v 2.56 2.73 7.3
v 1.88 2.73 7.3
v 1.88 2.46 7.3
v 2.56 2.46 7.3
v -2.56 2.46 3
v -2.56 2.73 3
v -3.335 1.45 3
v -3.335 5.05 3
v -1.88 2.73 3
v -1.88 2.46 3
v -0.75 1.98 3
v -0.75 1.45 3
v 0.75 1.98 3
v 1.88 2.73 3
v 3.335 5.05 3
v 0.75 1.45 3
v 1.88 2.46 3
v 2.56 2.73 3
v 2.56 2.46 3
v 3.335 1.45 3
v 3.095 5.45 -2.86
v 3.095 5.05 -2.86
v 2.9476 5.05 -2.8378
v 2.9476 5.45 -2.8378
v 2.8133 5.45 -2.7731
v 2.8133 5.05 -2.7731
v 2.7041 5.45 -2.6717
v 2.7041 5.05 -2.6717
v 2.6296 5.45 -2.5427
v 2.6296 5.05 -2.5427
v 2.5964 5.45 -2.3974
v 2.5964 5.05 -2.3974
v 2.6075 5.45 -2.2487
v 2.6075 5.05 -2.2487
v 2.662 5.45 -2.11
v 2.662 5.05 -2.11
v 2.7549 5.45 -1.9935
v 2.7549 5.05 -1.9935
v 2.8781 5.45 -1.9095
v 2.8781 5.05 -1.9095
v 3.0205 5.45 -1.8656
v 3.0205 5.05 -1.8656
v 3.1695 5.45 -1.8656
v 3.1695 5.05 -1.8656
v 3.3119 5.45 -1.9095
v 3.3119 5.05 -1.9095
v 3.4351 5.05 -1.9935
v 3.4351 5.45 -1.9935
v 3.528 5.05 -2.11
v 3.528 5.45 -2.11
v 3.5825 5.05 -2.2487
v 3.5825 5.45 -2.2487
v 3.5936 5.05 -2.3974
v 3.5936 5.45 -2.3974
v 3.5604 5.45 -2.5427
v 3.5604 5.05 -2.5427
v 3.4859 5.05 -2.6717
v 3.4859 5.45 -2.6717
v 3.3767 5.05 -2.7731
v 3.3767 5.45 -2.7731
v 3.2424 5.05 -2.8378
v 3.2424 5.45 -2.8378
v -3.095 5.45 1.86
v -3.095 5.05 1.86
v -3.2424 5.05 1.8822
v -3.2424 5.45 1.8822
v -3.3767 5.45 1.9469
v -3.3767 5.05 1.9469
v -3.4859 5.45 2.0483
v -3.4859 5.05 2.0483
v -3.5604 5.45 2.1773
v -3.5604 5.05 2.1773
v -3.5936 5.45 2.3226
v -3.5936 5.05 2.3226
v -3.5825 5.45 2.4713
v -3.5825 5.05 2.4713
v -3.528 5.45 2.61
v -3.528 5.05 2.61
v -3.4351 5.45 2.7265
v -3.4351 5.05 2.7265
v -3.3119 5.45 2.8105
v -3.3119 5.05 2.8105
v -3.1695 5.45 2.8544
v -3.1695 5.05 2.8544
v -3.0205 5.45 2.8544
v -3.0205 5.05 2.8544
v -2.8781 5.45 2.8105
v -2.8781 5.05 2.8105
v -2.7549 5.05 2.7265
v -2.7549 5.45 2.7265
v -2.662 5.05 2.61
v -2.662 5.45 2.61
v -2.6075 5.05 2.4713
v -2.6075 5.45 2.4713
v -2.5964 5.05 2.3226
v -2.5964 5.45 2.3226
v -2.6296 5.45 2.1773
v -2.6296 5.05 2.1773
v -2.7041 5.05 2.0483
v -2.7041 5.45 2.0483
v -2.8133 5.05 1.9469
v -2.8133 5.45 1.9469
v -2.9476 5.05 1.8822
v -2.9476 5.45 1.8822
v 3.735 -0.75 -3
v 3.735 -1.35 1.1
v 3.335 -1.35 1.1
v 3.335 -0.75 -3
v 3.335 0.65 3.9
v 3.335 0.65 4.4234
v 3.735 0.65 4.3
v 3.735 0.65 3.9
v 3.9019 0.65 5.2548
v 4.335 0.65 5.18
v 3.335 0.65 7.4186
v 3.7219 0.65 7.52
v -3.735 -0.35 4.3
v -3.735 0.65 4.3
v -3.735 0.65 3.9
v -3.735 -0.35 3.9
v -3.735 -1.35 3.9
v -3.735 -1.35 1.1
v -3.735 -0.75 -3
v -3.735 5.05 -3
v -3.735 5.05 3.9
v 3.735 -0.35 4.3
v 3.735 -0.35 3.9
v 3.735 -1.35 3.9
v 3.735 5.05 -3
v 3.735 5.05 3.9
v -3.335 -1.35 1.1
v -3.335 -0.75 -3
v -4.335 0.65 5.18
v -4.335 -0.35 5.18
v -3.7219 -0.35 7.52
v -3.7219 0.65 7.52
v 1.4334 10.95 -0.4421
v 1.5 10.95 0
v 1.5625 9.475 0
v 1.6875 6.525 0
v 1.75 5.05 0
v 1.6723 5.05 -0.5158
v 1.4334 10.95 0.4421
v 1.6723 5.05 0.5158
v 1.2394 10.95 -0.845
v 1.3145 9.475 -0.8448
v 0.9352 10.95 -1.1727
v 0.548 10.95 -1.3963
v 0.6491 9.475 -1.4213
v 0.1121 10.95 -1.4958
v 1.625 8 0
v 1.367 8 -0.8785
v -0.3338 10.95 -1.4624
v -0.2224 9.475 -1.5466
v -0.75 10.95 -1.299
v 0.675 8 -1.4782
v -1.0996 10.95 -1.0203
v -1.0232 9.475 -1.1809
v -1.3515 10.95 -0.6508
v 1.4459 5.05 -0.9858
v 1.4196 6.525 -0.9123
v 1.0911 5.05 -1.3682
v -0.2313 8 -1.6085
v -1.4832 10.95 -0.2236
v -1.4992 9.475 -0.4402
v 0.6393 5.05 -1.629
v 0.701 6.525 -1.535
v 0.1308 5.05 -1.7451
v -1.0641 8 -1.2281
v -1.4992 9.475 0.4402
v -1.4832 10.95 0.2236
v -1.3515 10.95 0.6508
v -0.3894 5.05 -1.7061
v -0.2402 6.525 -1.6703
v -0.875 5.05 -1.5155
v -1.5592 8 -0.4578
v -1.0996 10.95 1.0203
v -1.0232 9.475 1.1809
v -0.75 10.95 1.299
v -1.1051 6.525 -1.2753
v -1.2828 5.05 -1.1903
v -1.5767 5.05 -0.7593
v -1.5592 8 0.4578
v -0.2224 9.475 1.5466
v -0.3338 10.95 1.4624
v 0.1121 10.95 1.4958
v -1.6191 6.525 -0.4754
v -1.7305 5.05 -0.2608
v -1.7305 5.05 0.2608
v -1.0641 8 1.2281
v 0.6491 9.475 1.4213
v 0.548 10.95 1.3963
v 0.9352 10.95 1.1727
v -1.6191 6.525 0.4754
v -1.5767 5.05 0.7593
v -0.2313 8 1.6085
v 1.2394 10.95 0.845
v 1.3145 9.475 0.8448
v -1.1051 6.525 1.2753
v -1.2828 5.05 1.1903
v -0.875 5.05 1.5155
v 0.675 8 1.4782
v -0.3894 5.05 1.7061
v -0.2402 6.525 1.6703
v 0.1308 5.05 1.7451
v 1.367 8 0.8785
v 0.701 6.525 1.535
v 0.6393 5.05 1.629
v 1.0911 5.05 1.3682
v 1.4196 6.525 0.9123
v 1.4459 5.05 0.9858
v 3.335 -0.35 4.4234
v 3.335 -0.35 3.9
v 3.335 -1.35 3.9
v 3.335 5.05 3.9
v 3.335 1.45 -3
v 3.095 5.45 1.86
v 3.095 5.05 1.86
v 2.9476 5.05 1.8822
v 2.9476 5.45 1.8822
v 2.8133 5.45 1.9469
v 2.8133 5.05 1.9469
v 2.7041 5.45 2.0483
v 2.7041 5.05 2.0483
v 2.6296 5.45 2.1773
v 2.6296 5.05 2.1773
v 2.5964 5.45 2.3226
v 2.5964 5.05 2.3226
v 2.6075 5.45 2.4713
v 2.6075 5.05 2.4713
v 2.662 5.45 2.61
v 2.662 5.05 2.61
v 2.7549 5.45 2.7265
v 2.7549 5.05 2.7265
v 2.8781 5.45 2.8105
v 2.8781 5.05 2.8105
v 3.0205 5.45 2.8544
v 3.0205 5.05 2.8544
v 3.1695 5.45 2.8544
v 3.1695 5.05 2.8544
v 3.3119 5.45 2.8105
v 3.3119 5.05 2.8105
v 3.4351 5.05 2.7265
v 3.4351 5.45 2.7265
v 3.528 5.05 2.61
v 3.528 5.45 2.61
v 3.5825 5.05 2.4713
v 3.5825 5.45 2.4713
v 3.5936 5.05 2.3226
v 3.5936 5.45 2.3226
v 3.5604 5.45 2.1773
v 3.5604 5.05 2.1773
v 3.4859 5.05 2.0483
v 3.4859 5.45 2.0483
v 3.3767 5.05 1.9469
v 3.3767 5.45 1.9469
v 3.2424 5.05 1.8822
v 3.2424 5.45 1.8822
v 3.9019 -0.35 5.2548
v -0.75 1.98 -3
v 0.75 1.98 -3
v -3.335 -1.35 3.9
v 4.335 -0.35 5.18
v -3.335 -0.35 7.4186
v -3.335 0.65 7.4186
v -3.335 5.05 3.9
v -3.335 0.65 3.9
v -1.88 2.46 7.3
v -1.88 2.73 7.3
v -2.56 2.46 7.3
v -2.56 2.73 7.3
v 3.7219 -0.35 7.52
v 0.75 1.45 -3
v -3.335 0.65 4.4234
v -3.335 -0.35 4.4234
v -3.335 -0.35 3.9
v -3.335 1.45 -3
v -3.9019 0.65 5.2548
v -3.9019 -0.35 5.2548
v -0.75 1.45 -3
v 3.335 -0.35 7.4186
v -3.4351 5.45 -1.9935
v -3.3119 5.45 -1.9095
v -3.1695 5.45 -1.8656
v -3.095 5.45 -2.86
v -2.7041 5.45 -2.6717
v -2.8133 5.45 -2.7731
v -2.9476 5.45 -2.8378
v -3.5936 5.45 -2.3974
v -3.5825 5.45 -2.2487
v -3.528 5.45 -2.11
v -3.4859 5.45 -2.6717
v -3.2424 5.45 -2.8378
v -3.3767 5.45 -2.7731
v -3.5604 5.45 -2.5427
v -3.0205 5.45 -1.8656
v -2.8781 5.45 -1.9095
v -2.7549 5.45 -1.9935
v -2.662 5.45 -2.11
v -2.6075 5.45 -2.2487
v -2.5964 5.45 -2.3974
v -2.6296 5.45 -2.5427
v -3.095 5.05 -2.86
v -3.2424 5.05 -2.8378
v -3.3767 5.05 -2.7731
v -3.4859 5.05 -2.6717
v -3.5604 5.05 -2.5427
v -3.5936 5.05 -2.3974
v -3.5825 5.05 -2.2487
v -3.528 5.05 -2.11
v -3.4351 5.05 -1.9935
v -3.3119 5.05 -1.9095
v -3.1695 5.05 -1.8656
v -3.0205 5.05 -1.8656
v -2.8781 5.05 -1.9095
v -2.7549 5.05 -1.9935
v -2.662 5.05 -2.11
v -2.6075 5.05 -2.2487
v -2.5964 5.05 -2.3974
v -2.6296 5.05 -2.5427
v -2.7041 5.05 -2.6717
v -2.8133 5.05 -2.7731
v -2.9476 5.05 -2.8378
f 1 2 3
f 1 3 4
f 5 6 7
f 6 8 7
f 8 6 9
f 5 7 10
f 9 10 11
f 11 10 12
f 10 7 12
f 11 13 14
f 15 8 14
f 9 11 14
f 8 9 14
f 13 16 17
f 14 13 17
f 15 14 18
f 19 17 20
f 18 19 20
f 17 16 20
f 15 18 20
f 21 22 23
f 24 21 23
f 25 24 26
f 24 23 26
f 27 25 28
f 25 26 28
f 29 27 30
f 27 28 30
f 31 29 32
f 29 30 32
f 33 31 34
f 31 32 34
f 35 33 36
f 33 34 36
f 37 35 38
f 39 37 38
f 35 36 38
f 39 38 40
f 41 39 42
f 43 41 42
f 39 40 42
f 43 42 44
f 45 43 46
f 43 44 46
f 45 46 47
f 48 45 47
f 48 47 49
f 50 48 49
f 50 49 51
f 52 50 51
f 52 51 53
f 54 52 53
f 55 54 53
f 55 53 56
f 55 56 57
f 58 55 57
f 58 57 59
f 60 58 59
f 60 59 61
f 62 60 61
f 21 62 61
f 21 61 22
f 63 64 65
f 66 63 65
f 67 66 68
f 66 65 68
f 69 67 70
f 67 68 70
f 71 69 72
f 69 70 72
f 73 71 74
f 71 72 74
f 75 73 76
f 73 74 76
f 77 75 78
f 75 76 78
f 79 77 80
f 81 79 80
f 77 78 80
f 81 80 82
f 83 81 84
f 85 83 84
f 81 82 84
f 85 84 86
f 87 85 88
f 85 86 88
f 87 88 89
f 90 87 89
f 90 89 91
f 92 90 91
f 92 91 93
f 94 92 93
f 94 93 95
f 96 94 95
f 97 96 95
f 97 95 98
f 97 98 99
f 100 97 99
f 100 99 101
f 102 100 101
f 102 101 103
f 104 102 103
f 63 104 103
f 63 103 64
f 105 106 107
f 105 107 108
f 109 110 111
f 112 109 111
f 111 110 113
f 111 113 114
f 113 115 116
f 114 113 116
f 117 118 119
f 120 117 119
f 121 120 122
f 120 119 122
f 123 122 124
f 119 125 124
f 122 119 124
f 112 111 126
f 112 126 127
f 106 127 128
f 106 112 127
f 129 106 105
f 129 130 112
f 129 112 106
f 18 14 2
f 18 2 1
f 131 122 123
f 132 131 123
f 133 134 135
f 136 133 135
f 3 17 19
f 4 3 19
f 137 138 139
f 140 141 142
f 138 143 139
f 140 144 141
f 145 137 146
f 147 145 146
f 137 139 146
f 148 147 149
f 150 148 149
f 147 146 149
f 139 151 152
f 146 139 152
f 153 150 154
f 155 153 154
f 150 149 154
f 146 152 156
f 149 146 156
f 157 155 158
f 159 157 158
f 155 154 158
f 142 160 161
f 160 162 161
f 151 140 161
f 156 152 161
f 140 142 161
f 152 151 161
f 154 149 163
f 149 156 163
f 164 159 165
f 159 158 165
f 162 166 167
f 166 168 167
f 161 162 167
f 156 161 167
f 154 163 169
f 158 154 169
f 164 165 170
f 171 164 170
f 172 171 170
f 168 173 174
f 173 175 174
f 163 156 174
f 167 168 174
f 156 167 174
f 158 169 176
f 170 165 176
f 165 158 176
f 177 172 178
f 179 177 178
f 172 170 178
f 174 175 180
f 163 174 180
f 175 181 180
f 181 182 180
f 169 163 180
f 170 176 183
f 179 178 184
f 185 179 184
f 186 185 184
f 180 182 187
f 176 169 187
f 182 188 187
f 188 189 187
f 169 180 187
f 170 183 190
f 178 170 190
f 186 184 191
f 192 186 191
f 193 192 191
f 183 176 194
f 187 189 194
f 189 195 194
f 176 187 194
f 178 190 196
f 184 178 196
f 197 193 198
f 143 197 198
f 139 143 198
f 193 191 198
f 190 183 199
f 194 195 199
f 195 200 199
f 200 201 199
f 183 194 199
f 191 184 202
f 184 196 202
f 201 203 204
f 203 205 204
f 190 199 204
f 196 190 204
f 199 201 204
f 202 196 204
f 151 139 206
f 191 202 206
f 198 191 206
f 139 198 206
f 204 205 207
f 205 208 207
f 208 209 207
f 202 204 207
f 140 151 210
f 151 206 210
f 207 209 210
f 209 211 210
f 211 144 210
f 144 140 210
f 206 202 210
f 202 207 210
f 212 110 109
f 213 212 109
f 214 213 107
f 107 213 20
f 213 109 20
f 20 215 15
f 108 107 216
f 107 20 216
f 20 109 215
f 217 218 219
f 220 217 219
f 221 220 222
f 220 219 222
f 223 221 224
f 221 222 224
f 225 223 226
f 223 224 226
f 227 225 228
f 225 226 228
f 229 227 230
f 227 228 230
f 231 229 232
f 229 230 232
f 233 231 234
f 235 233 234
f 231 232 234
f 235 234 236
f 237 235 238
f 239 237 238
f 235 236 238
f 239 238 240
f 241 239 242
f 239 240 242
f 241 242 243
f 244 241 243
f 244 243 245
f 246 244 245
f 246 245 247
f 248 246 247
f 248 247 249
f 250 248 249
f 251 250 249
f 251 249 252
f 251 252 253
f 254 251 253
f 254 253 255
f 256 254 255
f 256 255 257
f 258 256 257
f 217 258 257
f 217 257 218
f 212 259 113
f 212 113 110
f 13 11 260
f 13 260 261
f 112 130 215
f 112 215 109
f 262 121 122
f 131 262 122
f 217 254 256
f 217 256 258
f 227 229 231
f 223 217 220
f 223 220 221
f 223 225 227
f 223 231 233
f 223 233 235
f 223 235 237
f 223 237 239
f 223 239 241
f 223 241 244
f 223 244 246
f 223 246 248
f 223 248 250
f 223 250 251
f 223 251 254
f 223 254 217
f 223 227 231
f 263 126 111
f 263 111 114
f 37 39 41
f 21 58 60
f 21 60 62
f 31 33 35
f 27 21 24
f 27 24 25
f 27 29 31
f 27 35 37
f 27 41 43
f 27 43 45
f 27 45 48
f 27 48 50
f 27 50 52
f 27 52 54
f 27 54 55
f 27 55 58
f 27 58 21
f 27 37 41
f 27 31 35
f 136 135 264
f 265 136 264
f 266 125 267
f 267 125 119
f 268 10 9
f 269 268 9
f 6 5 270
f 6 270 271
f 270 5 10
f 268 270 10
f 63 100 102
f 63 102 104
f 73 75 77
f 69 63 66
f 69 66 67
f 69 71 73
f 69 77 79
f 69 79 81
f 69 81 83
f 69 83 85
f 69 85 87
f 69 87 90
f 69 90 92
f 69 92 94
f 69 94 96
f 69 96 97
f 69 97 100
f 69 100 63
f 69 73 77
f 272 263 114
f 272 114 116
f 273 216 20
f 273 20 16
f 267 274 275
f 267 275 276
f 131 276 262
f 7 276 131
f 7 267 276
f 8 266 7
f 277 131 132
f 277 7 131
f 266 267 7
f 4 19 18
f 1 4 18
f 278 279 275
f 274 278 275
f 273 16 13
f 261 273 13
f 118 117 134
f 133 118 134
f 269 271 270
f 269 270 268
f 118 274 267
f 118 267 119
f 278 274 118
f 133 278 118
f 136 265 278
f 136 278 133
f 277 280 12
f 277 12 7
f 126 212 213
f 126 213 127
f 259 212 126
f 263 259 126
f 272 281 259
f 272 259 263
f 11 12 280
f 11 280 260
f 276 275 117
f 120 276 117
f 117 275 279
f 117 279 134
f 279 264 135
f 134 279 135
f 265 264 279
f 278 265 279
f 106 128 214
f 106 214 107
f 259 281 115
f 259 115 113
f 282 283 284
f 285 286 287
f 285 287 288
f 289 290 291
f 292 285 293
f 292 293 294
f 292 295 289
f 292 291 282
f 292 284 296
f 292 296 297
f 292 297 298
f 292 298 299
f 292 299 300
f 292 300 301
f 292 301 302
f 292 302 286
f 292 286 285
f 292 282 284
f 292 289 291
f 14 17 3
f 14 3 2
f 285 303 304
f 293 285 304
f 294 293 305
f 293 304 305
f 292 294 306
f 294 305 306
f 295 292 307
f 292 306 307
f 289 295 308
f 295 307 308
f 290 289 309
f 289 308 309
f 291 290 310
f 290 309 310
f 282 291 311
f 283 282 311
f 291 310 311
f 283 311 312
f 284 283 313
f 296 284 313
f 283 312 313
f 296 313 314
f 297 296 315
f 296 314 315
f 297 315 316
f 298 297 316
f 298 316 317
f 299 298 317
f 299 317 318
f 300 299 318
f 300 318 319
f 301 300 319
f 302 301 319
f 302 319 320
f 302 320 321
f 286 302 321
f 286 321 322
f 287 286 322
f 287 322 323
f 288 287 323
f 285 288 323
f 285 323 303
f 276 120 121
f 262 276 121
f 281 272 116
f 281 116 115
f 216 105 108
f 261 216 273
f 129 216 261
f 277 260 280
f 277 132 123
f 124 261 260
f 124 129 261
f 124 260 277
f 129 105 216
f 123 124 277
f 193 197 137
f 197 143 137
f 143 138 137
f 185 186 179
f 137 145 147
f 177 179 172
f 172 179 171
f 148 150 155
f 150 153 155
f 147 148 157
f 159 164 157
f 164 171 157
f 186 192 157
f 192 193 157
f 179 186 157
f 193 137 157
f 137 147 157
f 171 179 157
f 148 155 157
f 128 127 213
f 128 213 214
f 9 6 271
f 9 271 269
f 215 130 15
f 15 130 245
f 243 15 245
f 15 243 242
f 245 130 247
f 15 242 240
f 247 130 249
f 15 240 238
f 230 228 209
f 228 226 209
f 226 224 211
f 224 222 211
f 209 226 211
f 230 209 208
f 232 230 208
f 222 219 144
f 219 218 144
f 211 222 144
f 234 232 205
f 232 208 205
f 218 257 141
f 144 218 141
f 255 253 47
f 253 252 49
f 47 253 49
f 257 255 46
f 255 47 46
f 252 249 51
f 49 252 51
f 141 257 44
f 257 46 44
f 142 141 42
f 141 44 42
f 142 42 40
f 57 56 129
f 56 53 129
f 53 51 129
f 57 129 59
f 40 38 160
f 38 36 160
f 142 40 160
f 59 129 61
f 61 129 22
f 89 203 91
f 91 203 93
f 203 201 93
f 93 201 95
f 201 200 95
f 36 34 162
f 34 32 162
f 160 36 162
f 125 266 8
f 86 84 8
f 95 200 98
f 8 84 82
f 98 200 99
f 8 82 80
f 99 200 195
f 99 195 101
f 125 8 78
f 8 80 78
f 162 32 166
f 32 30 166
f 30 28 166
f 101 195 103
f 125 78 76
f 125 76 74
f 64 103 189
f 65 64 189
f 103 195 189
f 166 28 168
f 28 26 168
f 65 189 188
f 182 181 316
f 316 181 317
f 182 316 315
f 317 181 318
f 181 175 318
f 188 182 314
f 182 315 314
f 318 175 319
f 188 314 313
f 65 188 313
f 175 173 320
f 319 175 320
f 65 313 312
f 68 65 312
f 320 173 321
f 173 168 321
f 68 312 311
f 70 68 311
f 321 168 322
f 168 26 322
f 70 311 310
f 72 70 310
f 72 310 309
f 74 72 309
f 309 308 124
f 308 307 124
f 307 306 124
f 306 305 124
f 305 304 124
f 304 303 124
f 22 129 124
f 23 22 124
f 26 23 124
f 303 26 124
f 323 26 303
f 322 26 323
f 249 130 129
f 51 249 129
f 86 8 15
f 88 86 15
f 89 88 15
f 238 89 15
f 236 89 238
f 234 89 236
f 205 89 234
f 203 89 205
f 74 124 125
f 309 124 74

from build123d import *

# Parameters (mm, degrees)
SKETCH1_W           = 7
SKETCH1_H           = 6
BOSS_EXTRUDE1_DEPTH = 5.05
SKETCH3_W           = 0.68
SKETCH3_H           = 0.27
BOSS_EXTRUDE2_DEPTH = 4.3
SKETCH4_W           = 0.4
SKETCH4_H           = 5.8
BOSS_EXTRUDE3_DEPTH = 6.9
SKETCH6_W           = 6.67
SKETCH6_H           = 1.45
CUT_EXTRUDE1_DEPTH  = 13.06410896
CUT_EXTRUDE2_REACH  = 10.686
SKETCH7_W           = 1.5
SKETCH7_H           = 0.53
BOSS_EXTRUDE5_START = -3.6
SKETCH9_R           = 0.5
BOSS_EXTRUDE5_DEPTH = 4
BOSS_EXTRUDE6_DEPTH = 0.4
BOSS_EXTRUDE4_START = -1
BOSS_EXTRUDE4_DEPTH = 1


with BuildPart() as part:
    # Sketch1 → Boss-Extrude1 (new body)
    with BuildSketch(Plane(origin=(0, 0, 0), x_dir=(1, 0, 0), z_dir=(0, 1, 0))):
        Rectangle(SKETCH1_W, SKETCH1_H)
    extrude(amount=BOSS_EXTRUDE1_DEPTH)

    # Sketch3 → Boss-Extrude2 (add)
    with BuildSketch(Plane.XY.offset(3)):
        with Locations((-2.22, 2.595)):
            Rectangle(SKETCH3_W, SKETCH3_H)
        with Locations((2.22, 2.595)):
            Rectangle(SKETCH3_W, SKETCH3_H)
    extrude(amount=BOSS_EXTRUDE2_DEPTH)

    # Sketch4 → Boss-Extrude3 (add)
    with BuildSketch(Plane(origin=(0, 0, -3), x_dir=(-1, 0, 0), z_dir=(0, 0, -1))):
        with Locations((-3.535, 2.15)):
            Rectangle(SKETCH4_W, SKETCH4_H)
        with Locations((3.535, 2.15)):
            Rectangle(SKETCH4_W, SKETCH4_H)
    extrude(amount=-BOSS_EXTRUDE3_DEPTH)

    # Sketch6 → Cut-Extrude1 (cut, through all)
    with BuildSketch(Plane(origin=(0, 0, -3), x_dir=(-1, 0, 0), z_dir=(0, 0, -1))):
        with Locations((0, 0.725)):
            Rectangle(SKETCH6_W, SKETCH6_H)
    extrude(amount=-CUT_EXTRUDE1_DEPTH, mode=Mode.SUBTRACT)

    # Sketch7 → Cut-Extrude2 (cut, up to next)
    with BuildSketch(Plane.XY.offset(3), mode=Mode.PRIVATE) as cut_extrude2_sk1:
        with Locations((0, 1.715)):
            Rectangle(SKETCH7_W, SKETCH7_H)
    cut_extrude2_tool1 = extrude(cut_extrude2_sk1.sketch, amount=-CUT_EXTRUDE2_REACH, mode=Mode.PRIVATE) & part.part
    add(cut_extrude2_tool1.solids().sort_by_distance((0, 1.715, 3))[0], mode=Mode.SUBTRACT)

    # Sketch9 → Boss-Extrude5 (add)
    with BuildSketch(Plane(origin=(0, 5.05, 0), x_dir=(1, 0, 0), z_dir=(0, 1, 0)).offset(BOSS_EXTRUDE5_START)):
        with Locations(Location((-3.095, 2.36, 0), (0, 0, 90))):
            Circle(SKETCH9_R)
        with Locations(Location((-3.095, -2.36, 0), (0, 0, 90))):
            Circle(SKETCH9_R)
        with Locations(Location((3.095, 2.36, 0), (0, 0, 90))):
            Circle(SKETCH9_R)
        with Locations(Location((3.095, -2.36, 0), (0, 0, 90))):
            Circle(SKETCH9_R)
    extrude(amount=BOSS_EXTRUDE5_DEPTH)

    # Sketch2 → Revolve1 (revolve)
    with BuildSketch(Plane.XY):
        Polygon((0, 5.05), (0, 10.95), (1.5, 10.95), (1.75, 5.05), align=None)
    revolve(axis=Axis((0, 5.05, 0), (0, 1, 0)))

    # Sketch10 → Boss-Extrude6 (add)
    with BuildSketch(Plane.ZY.offset(3.735)):
        Polygon((3.9, -0.75), (3.9, -1.35), (1.1, -1.35), (-3, -0.75), align=None)
    boss_extrude6 = extrude(amount=-BOSS_EXTRUDE6_DEPTH)

    # Sketch8 → Boss-Extrude4 (add)
    with BuildSketch(Plane.XZ.offset(1.35).offset(BOSS_EXTRUDE4_START)):
        Polygon((-3.735, 3.9), (-3.735, 4.3), (-4.335, 5.18), (-3.721940695, 7.52), (-3.335, 7.41862496), (-3.901894327, 5.254833117), (-3.335, 4.423388104), (-3.335, 3.9), align=None)
    boss_extrude4 = extrude(amount=-BOSS_EXTRUDE4_DEPTH)

    # Mirror1: Boss-Extrude6, Boss-Extrude4 across plane
    add(boss_extrude6.mirror(Plane(origin=(0, 0, 0), x_dir=(0, 0, 1), z_dir=(1, 0, 0))))
    add(boss_extrude4.mirror(Plane(origin=(0, 0, 0), x_dir=(0, 0, 1), z_dir=(1, 0, 0))))


solid = part.part
